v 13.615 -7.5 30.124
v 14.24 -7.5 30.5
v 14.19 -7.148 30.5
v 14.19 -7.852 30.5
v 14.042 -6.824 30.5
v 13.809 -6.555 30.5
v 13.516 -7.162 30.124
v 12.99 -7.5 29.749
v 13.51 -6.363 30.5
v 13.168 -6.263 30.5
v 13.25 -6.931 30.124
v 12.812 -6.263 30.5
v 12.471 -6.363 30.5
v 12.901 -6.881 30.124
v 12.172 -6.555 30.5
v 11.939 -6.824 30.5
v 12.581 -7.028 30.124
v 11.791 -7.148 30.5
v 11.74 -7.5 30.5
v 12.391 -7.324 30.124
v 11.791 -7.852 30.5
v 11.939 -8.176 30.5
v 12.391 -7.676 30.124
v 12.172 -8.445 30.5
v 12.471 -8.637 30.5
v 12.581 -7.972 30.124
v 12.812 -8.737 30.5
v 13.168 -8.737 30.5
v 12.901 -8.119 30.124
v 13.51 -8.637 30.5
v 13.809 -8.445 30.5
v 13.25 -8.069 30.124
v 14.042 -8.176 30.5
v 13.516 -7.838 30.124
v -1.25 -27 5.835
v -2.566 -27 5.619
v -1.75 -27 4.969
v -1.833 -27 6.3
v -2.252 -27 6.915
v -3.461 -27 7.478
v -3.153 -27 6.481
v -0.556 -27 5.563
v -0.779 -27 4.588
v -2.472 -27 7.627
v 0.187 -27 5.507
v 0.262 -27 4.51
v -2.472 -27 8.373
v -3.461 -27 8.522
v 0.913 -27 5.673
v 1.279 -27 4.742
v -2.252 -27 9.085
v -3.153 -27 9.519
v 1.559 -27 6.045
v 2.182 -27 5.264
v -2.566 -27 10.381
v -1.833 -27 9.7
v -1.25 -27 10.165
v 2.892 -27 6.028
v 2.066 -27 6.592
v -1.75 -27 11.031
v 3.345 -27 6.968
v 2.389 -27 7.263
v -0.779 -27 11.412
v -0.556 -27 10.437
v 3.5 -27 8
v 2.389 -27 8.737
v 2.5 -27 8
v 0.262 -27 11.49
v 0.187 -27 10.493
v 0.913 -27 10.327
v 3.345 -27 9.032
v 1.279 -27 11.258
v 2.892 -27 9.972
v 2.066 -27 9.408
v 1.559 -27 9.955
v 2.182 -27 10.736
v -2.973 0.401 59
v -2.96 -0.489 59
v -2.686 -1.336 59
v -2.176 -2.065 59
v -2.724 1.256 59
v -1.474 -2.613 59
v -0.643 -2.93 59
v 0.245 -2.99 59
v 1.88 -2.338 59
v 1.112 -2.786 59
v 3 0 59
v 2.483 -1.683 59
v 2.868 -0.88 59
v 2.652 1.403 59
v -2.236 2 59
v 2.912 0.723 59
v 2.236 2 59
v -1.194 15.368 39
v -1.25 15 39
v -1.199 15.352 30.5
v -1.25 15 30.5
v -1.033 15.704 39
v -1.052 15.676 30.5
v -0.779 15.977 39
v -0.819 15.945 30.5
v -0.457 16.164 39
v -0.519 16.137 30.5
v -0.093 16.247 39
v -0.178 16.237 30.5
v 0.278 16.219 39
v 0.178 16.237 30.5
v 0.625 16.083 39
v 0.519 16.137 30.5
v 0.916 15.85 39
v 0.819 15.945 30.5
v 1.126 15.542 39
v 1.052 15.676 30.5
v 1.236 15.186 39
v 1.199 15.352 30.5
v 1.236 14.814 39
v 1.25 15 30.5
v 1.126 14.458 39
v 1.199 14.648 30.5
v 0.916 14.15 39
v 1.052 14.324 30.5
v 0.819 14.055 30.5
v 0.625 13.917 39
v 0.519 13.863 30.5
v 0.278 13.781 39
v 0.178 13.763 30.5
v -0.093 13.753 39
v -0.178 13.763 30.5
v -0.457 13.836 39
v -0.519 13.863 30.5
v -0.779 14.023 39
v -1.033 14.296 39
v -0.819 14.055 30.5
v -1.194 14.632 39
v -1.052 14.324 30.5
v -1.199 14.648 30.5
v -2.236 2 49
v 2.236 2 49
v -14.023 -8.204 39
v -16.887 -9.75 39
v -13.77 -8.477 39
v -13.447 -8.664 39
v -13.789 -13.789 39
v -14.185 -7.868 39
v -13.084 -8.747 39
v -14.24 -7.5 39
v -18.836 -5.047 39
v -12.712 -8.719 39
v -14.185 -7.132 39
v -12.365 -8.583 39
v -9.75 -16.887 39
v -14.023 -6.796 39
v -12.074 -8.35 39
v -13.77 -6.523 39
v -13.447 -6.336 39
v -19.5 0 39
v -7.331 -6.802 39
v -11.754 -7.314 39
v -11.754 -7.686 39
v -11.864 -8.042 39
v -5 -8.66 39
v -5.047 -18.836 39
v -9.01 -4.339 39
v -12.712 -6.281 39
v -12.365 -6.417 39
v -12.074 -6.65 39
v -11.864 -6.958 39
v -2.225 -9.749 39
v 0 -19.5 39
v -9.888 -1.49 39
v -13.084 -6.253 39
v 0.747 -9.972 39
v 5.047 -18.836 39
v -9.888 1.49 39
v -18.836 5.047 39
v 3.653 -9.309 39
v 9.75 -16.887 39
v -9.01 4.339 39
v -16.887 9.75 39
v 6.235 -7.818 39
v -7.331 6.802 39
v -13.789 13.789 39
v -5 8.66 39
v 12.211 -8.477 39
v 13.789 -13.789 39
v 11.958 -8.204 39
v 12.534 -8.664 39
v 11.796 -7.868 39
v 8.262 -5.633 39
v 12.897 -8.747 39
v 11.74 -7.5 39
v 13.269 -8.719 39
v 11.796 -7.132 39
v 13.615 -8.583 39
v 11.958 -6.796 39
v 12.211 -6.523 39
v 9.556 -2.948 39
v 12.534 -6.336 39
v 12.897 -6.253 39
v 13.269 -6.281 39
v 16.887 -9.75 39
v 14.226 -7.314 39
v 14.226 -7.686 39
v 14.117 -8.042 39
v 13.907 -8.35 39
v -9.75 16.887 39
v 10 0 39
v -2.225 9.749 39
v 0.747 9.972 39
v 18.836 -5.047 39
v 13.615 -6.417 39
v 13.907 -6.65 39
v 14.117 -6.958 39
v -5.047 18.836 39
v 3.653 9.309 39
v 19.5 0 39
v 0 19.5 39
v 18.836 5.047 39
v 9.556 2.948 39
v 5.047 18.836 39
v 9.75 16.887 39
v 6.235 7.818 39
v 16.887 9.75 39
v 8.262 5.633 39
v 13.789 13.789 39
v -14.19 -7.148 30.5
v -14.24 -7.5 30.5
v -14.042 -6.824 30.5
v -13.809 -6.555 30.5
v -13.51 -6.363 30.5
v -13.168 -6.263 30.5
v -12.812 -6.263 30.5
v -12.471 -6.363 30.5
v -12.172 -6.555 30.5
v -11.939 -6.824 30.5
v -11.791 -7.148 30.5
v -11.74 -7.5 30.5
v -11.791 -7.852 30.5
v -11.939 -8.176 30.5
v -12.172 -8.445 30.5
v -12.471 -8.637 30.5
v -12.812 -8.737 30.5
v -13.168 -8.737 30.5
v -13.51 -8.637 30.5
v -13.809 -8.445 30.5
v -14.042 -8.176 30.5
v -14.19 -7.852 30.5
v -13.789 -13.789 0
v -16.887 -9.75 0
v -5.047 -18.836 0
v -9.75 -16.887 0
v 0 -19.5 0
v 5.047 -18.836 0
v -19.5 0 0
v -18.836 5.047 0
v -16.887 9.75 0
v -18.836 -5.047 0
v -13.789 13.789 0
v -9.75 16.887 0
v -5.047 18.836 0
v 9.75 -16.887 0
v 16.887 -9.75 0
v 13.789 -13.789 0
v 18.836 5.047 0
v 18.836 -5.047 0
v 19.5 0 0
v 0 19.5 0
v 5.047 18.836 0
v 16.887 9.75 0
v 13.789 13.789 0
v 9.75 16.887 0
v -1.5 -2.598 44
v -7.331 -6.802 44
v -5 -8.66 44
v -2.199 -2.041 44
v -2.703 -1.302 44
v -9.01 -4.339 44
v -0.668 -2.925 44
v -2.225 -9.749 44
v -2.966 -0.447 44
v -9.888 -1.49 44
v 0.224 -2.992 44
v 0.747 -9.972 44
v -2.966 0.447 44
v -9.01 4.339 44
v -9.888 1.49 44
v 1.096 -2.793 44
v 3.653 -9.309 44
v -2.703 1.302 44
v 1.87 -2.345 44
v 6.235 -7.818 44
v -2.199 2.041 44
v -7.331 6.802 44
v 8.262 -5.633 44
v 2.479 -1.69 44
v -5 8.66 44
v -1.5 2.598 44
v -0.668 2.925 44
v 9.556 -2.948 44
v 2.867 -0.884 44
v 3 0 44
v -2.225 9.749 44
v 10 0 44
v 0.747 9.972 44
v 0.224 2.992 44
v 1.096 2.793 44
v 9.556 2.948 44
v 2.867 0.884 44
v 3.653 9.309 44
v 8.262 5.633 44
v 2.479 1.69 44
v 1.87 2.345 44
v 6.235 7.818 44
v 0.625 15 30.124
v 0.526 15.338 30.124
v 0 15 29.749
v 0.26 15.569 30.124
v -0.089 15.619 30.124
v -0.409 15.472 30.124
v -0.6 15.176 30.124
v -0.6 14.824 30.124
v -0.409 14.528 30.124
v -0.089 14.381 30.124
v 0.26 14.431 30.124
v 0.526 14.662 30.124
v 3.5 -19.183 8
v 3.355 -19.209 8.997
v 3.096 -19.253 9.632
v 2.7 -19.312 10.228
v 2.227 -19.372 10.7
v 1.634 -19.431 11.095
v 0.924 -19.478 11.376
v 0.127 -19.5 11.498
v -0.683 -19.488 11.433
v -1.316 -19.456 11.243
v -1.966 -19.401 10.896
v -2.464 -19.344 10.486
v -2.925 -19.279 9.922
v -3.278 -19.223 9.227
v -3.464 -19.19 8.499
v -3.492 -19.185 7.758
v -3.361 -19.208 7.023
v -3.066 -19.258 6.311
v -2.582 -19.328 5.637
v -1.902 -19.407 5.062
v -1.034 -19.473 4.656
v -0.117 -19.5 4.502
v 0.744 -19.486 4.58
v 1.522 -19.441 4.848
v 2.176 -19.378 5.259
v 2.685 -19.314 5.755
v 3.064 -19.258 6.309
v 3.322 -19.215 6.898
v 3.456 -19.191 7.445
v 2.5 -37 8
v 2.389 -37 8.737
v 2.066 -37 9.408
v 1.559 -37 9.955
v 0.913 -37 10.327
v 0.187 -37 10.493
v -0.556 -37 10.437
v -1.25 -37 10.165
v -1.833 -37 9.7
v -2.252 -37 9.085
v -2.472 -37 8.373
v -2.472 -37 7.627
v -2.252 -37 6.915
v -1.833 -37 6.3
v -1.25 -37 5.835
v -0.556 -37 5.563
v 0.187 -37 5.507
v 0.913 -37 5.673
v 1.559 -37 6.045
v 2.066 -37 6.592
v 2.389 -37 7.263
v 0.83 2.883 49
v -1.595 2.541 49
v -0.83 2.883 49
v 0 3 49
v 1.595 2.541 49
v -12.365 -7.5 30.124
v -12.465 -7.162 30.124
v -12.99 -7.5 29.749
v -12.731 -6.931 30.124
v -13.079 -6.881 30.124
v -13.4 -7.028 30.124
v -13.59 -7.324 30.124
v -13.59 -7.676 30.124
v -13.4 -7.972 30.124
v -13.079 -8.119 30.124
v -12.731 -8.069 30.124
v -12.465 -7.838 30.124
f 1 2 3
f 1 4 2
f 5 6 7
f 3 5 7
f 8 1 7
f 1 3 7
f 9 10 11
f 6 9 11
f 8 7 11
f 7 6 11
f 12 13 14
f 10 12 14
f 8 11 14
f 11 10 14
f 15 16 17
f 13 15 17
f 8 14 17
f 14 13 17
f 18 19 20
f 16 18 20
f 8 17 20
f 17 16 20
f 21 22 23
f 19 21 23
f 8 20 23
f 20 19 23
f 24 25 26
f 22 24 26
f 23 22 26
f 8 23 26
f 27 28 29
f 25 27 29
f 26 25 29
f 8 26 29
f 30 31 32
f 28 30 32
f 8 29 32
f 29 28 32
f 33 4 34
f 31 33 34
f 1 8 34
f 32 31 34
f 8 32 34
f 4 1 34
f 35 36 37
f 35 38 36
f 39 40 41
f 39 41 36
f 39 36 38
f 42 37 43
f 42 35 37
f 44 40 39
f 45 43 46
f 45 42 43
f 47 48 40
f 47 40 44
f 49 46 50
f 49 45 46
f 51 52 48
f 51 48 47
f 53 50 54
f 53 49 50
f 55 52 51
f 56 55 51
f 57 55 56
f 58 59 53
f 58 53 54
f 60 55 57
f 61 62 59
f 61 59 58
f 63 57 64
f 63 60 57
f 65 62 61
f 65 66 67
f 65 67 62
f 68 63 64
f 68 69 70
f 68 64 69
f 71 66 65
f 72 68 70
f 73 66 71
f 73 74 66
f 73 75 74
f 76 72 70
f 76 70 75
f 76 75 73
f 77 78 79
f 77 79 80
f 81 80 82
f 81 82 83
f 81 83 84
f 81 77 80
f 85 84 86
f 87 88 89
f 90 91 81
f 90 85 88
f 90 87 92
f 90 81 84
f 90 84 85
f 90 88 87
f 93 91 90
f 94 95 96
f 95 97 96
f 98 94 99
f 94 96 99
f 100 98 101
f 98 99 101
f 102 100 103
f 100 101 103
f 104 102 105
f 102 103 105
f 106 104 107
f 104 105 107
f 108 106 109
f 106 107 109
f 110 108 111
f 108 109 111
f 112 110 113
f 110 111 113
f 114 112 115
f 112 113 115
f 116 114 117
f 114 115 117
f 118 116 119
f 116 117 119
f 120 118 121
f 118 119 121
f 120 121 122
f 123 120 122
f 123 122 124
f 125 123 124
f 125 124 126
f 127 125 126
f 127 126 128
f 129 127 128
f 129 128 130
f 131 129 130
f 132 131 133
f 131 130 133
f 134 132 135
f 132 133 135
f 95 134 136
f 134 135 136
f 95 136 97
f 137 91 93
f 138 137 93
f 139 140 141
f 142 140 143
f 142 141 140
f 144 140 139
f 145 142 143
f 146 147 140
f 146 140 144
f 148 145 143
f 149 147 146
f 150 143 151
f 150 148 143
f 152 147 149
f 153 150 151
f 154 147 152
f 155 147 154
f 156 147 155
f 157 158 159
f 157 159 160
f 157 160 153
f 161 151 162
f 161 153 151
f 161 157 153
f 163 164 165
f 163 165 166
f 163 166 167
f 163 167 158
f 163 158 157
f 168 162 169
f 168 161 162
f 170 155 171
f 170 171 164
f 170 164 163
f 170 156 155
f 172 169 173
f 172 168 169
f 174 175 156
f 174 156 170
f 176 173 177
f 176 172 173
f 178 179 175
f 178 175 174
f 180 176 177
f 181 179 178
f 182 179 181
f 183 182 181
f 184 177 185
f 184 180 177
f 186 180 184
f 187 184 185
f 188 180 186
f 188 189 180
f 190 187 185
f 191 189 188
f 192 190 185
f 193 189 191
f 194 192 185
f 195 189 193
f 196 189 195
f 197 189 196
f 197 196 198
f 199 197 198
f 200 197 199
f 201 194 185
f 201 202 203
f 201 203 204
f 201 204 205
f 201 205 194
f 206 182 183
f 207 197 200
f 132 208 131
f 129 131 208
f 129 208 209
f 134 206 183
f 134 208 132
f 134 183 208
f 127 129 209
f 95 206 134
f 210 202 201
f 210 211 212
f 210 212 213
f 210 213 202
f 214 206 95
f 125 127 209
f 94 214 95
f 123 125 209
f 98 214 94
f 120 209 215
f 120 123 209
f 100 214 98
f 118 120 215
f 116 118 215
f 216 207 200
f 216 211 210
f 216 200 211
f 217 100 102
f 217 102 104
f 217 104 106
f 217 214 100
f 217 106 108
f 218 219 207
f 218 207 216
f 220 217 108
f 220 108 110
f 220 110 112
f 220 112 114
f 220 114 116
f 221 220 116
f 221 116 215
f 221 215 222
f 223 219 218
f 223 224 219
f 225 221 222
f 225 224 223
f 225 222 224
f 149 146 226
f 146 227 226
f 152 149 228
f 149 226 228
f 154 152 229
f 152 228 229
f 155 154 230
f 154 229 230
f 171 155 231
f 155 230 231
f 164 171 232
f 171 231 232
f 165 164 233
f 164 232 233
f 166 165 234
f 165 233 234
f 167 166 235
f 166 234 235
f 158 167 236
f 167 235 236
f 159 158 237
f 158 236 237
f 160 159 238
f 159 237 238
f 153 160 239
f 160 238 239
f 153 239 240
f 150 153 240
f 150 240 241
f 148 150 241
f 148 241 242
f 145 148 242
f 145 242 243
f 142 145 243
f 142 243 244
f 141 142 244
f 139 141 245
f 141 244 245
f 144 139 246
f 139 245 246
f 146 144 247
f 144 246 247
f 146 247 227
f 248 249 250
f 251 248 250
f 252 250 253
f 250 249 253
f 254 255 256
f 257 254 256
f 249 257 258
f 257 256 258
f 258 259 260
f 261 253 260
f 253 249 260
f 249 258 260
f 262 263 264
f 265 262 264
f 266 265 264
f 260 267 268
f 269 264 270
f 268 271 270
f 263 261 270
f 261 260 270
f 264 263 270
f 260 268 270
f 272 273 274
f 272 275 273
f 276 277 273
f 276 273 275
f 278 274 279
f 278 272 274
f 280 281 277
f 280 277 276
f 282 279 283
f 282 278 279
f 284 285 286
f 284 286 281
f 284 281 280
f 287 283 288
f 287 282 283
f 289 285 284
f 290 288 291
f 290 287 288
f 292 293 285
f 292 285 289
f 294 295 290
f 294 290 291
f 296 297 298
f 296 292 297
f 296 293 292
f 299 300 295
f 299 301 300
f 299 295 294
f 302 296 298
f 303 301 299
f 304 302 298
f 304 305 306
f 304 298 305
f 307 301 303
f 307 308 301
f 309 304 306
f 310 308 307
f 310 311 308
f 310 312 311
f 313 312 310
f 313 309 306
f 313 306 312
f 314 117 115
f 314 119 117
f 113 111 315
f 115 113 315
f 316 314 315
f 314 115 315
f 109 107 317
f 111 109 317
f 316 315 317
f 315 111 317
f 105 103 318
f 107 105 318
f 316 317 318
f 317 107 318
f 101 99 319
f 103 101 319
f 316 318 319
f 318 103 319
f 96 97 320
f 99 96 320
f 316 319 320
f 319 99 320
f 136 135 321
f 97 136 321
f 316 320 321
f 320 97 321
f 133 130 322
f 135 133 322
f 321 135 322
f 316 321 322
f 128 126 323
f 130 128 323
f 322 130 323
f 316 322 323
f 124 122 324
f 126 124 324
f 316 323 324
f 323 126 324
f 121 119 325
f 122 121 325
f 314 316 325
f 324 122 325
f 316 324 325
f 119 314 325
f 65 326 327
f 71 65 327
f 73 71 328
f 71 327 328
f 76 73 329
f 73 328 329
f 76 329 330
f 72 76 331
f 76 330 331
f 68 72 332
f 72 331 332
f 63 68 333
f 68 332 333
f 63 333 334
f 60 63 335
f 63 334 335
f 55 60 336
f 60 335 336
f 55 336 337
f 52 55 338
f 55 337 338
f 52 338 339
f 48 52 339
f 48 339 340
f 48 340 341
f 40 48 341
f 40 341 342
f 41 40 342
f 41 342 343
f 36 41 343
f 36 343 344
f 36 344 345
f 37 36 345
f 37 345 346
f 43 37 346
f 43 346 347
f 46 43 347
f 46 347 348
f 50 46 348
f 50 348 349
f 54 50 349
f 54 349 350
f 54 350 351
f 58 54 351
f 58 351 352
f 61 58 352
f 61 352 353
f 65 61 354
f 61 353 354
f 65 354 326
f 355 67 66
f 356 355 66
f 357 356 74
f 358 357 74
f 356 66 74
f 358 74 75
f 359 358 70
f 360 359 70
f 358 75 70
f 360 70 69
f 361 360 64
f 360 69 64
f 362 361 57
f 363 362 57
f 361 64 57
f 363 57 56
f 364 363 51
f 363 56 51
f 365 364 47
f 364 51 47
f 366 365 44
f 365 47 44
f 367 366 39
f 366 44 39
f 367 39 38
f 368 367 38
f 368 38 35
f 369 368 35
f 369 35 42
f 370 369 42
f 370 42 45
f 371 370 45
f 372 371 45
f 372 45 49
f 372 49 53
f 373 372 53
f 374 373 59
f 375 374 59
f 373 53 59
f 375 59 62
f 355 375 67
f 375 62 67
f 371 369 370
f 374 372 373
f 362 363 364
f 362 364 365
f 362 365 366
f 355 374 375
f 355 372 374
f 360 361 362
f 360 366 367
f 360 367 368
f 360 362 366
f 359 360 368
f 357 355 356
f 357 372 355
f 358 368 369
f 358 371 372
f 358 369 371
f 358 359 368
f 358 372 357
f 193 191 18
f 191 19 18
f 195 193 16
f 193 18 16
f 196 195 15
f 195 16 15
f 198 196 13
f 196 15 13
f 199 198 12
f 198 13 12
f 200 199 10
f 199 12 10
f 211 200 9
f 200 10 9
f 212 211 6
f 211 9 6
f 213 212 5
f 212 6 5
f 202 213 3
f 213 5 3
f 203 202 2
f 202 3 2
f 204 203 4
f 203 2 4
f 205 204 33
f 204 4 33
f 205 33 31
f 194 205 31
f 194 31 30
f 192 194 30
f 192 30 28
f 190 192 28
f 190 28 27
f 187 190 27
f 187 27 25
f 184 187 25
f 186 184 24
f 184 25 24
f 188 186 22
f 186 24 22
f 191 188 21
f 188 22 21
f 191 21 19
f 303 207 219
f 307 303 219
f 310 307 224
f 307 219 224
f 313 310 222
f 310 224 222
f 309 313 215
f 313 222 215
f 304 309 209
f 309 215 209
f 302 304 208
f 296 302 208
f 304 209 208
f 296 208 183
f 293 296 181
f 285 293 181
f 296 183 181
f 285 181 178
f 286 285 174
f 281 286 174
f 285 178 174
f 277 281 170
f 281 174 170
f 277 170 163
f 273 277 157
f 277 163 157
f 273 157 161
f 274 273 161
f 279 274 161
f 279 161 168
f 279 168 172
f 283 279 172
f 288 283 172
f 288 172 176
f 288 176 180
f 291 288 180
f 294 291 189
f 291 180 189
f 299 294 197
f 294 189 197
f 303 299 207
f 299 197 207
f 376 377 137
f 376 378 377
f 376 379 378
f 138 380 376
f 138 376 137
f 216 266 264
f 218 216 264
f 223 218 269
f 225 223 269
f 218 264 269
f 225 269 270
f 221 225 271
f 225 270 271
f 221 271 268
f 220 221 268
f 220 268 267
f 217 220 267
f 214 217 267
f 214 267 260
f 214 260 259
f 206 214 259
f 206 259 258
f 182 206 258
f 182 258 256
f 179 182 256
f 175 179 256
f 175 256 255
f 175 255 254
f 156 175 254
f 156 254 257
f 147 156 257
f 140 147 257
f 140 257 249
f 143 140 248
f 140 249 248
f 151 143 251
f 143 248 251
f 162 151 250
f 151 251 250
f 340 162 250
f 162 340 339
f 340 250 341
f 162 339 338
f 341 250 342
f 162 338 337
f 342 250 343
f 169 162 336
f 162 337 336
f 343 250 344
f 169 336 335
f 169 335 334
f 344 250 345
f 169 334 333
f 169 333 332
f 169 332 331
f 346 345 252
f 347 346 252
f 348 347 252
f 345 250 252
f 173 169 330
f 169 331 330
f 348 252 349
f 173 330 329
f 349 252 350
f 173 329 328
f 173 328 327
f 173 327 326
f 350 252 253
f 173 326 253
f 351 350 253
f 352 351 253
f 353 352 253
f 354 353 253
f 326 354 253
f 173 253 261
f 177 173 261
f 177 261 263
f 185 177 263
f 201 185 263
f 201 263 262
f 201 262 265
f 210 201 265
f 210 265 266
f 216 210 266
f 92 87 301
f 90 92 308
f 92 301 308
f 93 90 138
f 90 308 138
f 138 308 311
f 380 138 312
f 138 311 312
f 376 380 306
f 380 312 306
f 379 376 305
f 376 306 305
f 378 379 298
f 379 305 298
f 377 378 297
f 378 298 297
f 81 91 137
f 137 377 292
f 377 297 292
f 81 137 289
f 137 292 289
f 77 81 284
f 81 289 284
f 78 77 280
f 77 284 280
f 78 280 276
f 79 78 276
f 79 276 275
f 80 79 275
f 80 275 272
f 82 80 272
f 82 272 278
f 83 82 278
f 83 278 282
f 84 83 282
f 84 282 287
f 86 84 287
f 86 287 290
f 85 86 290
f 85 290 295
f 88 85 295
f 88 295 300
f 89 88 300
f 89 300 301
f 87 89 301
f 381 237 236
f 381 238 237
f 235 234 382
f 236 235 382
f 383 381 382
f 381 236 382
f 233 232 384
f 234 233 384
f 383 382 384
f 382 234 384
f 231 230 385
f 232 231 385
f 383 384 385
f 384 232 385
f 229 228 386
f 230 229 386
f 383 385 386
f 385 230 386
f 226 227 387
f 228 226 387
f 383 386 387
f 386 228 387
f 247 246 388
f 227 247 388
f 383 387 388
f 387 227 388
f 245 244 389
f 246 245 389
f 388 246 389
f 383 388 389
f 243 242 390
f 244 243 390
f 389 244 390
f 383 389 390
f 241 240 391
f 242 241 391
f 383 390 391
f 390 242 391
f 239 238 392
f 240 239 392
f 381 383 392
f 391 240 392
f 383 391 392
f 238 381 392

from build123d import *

# Parameters (mm, degrees)
F0_R      = 19.5
F1_DEPTH  = 39
F2_R      = 10
F3_DEPTH  = 5
F4_R      = 3
F5_DEPTH  = 15
F7_D      = 2.5
F7_DEPTH  = 8.5
F7_TIP    = 0.7510757738
F8_W      = 4.472135955
F8_H      = 1
F9_DEPTH  = 10
F10_R     = 3.5
F11_DEPTH = 27
F12_R     = 2.5
F13_DEPTH = 10


with BuildPart() as f1:
    # F0 (on Top) → F1 (new body)
    with BuildSketch(Plane.XY):
        Circle(F0_R)
    extrude(amount=F1_DEPTH)

    # F2 (on face) → F3 (join)
    with BuildSketch(Plane.XY.offset(39)):
        Circle(F2_R)
    extrude(amount=F3_DEPTH)

    # F4 (on face) → F5 (join)
    with BuildSketch(Plane.XY.offset(44)):
        Circle(F4_R)
    extrude(amount=F5_DEPTH)

    # F7
    with Locations(Plane.XY.offset(39)):
        with Locations((0, 15), (-12.9903810568, -7.5), (12.9903810568, -7.5)):
            Hole(F7_D / 2, depth=F7_DEPTH)
            with Locations((0, 0, -(F7_DEPTH + F7_TIP / 2))):  # 118° drill point
                Cone(0, F7_D / 2, F7_TIP, mode=Mode.SUBTRACT)

    # F8 (on face) → F9 (cut)
    with BuildSketch(Plane.XY.offset(59)):
        with Locations((0, 2.5)):
            Rectangle(F8_W, F8_H)
    extrude(amount=-F9_DEPTH, mode=Mode.SUBTRACT)

    # F10 (on Front) → F11 (join)
    with BuildSketch(Plane.XZ):
        with Locations((0, 8)):
            Circle(F10_R)
    extrude(amount=F11_DEPTH)

    # F12 (on face) → F13 (join)
    with BuildSketch(Plane.XZ.offset(27)):
        with Locations((0, 8)):
            Circle(F12_R)
    extrude(amount=F13_DEPTH)


solid = f1.part
